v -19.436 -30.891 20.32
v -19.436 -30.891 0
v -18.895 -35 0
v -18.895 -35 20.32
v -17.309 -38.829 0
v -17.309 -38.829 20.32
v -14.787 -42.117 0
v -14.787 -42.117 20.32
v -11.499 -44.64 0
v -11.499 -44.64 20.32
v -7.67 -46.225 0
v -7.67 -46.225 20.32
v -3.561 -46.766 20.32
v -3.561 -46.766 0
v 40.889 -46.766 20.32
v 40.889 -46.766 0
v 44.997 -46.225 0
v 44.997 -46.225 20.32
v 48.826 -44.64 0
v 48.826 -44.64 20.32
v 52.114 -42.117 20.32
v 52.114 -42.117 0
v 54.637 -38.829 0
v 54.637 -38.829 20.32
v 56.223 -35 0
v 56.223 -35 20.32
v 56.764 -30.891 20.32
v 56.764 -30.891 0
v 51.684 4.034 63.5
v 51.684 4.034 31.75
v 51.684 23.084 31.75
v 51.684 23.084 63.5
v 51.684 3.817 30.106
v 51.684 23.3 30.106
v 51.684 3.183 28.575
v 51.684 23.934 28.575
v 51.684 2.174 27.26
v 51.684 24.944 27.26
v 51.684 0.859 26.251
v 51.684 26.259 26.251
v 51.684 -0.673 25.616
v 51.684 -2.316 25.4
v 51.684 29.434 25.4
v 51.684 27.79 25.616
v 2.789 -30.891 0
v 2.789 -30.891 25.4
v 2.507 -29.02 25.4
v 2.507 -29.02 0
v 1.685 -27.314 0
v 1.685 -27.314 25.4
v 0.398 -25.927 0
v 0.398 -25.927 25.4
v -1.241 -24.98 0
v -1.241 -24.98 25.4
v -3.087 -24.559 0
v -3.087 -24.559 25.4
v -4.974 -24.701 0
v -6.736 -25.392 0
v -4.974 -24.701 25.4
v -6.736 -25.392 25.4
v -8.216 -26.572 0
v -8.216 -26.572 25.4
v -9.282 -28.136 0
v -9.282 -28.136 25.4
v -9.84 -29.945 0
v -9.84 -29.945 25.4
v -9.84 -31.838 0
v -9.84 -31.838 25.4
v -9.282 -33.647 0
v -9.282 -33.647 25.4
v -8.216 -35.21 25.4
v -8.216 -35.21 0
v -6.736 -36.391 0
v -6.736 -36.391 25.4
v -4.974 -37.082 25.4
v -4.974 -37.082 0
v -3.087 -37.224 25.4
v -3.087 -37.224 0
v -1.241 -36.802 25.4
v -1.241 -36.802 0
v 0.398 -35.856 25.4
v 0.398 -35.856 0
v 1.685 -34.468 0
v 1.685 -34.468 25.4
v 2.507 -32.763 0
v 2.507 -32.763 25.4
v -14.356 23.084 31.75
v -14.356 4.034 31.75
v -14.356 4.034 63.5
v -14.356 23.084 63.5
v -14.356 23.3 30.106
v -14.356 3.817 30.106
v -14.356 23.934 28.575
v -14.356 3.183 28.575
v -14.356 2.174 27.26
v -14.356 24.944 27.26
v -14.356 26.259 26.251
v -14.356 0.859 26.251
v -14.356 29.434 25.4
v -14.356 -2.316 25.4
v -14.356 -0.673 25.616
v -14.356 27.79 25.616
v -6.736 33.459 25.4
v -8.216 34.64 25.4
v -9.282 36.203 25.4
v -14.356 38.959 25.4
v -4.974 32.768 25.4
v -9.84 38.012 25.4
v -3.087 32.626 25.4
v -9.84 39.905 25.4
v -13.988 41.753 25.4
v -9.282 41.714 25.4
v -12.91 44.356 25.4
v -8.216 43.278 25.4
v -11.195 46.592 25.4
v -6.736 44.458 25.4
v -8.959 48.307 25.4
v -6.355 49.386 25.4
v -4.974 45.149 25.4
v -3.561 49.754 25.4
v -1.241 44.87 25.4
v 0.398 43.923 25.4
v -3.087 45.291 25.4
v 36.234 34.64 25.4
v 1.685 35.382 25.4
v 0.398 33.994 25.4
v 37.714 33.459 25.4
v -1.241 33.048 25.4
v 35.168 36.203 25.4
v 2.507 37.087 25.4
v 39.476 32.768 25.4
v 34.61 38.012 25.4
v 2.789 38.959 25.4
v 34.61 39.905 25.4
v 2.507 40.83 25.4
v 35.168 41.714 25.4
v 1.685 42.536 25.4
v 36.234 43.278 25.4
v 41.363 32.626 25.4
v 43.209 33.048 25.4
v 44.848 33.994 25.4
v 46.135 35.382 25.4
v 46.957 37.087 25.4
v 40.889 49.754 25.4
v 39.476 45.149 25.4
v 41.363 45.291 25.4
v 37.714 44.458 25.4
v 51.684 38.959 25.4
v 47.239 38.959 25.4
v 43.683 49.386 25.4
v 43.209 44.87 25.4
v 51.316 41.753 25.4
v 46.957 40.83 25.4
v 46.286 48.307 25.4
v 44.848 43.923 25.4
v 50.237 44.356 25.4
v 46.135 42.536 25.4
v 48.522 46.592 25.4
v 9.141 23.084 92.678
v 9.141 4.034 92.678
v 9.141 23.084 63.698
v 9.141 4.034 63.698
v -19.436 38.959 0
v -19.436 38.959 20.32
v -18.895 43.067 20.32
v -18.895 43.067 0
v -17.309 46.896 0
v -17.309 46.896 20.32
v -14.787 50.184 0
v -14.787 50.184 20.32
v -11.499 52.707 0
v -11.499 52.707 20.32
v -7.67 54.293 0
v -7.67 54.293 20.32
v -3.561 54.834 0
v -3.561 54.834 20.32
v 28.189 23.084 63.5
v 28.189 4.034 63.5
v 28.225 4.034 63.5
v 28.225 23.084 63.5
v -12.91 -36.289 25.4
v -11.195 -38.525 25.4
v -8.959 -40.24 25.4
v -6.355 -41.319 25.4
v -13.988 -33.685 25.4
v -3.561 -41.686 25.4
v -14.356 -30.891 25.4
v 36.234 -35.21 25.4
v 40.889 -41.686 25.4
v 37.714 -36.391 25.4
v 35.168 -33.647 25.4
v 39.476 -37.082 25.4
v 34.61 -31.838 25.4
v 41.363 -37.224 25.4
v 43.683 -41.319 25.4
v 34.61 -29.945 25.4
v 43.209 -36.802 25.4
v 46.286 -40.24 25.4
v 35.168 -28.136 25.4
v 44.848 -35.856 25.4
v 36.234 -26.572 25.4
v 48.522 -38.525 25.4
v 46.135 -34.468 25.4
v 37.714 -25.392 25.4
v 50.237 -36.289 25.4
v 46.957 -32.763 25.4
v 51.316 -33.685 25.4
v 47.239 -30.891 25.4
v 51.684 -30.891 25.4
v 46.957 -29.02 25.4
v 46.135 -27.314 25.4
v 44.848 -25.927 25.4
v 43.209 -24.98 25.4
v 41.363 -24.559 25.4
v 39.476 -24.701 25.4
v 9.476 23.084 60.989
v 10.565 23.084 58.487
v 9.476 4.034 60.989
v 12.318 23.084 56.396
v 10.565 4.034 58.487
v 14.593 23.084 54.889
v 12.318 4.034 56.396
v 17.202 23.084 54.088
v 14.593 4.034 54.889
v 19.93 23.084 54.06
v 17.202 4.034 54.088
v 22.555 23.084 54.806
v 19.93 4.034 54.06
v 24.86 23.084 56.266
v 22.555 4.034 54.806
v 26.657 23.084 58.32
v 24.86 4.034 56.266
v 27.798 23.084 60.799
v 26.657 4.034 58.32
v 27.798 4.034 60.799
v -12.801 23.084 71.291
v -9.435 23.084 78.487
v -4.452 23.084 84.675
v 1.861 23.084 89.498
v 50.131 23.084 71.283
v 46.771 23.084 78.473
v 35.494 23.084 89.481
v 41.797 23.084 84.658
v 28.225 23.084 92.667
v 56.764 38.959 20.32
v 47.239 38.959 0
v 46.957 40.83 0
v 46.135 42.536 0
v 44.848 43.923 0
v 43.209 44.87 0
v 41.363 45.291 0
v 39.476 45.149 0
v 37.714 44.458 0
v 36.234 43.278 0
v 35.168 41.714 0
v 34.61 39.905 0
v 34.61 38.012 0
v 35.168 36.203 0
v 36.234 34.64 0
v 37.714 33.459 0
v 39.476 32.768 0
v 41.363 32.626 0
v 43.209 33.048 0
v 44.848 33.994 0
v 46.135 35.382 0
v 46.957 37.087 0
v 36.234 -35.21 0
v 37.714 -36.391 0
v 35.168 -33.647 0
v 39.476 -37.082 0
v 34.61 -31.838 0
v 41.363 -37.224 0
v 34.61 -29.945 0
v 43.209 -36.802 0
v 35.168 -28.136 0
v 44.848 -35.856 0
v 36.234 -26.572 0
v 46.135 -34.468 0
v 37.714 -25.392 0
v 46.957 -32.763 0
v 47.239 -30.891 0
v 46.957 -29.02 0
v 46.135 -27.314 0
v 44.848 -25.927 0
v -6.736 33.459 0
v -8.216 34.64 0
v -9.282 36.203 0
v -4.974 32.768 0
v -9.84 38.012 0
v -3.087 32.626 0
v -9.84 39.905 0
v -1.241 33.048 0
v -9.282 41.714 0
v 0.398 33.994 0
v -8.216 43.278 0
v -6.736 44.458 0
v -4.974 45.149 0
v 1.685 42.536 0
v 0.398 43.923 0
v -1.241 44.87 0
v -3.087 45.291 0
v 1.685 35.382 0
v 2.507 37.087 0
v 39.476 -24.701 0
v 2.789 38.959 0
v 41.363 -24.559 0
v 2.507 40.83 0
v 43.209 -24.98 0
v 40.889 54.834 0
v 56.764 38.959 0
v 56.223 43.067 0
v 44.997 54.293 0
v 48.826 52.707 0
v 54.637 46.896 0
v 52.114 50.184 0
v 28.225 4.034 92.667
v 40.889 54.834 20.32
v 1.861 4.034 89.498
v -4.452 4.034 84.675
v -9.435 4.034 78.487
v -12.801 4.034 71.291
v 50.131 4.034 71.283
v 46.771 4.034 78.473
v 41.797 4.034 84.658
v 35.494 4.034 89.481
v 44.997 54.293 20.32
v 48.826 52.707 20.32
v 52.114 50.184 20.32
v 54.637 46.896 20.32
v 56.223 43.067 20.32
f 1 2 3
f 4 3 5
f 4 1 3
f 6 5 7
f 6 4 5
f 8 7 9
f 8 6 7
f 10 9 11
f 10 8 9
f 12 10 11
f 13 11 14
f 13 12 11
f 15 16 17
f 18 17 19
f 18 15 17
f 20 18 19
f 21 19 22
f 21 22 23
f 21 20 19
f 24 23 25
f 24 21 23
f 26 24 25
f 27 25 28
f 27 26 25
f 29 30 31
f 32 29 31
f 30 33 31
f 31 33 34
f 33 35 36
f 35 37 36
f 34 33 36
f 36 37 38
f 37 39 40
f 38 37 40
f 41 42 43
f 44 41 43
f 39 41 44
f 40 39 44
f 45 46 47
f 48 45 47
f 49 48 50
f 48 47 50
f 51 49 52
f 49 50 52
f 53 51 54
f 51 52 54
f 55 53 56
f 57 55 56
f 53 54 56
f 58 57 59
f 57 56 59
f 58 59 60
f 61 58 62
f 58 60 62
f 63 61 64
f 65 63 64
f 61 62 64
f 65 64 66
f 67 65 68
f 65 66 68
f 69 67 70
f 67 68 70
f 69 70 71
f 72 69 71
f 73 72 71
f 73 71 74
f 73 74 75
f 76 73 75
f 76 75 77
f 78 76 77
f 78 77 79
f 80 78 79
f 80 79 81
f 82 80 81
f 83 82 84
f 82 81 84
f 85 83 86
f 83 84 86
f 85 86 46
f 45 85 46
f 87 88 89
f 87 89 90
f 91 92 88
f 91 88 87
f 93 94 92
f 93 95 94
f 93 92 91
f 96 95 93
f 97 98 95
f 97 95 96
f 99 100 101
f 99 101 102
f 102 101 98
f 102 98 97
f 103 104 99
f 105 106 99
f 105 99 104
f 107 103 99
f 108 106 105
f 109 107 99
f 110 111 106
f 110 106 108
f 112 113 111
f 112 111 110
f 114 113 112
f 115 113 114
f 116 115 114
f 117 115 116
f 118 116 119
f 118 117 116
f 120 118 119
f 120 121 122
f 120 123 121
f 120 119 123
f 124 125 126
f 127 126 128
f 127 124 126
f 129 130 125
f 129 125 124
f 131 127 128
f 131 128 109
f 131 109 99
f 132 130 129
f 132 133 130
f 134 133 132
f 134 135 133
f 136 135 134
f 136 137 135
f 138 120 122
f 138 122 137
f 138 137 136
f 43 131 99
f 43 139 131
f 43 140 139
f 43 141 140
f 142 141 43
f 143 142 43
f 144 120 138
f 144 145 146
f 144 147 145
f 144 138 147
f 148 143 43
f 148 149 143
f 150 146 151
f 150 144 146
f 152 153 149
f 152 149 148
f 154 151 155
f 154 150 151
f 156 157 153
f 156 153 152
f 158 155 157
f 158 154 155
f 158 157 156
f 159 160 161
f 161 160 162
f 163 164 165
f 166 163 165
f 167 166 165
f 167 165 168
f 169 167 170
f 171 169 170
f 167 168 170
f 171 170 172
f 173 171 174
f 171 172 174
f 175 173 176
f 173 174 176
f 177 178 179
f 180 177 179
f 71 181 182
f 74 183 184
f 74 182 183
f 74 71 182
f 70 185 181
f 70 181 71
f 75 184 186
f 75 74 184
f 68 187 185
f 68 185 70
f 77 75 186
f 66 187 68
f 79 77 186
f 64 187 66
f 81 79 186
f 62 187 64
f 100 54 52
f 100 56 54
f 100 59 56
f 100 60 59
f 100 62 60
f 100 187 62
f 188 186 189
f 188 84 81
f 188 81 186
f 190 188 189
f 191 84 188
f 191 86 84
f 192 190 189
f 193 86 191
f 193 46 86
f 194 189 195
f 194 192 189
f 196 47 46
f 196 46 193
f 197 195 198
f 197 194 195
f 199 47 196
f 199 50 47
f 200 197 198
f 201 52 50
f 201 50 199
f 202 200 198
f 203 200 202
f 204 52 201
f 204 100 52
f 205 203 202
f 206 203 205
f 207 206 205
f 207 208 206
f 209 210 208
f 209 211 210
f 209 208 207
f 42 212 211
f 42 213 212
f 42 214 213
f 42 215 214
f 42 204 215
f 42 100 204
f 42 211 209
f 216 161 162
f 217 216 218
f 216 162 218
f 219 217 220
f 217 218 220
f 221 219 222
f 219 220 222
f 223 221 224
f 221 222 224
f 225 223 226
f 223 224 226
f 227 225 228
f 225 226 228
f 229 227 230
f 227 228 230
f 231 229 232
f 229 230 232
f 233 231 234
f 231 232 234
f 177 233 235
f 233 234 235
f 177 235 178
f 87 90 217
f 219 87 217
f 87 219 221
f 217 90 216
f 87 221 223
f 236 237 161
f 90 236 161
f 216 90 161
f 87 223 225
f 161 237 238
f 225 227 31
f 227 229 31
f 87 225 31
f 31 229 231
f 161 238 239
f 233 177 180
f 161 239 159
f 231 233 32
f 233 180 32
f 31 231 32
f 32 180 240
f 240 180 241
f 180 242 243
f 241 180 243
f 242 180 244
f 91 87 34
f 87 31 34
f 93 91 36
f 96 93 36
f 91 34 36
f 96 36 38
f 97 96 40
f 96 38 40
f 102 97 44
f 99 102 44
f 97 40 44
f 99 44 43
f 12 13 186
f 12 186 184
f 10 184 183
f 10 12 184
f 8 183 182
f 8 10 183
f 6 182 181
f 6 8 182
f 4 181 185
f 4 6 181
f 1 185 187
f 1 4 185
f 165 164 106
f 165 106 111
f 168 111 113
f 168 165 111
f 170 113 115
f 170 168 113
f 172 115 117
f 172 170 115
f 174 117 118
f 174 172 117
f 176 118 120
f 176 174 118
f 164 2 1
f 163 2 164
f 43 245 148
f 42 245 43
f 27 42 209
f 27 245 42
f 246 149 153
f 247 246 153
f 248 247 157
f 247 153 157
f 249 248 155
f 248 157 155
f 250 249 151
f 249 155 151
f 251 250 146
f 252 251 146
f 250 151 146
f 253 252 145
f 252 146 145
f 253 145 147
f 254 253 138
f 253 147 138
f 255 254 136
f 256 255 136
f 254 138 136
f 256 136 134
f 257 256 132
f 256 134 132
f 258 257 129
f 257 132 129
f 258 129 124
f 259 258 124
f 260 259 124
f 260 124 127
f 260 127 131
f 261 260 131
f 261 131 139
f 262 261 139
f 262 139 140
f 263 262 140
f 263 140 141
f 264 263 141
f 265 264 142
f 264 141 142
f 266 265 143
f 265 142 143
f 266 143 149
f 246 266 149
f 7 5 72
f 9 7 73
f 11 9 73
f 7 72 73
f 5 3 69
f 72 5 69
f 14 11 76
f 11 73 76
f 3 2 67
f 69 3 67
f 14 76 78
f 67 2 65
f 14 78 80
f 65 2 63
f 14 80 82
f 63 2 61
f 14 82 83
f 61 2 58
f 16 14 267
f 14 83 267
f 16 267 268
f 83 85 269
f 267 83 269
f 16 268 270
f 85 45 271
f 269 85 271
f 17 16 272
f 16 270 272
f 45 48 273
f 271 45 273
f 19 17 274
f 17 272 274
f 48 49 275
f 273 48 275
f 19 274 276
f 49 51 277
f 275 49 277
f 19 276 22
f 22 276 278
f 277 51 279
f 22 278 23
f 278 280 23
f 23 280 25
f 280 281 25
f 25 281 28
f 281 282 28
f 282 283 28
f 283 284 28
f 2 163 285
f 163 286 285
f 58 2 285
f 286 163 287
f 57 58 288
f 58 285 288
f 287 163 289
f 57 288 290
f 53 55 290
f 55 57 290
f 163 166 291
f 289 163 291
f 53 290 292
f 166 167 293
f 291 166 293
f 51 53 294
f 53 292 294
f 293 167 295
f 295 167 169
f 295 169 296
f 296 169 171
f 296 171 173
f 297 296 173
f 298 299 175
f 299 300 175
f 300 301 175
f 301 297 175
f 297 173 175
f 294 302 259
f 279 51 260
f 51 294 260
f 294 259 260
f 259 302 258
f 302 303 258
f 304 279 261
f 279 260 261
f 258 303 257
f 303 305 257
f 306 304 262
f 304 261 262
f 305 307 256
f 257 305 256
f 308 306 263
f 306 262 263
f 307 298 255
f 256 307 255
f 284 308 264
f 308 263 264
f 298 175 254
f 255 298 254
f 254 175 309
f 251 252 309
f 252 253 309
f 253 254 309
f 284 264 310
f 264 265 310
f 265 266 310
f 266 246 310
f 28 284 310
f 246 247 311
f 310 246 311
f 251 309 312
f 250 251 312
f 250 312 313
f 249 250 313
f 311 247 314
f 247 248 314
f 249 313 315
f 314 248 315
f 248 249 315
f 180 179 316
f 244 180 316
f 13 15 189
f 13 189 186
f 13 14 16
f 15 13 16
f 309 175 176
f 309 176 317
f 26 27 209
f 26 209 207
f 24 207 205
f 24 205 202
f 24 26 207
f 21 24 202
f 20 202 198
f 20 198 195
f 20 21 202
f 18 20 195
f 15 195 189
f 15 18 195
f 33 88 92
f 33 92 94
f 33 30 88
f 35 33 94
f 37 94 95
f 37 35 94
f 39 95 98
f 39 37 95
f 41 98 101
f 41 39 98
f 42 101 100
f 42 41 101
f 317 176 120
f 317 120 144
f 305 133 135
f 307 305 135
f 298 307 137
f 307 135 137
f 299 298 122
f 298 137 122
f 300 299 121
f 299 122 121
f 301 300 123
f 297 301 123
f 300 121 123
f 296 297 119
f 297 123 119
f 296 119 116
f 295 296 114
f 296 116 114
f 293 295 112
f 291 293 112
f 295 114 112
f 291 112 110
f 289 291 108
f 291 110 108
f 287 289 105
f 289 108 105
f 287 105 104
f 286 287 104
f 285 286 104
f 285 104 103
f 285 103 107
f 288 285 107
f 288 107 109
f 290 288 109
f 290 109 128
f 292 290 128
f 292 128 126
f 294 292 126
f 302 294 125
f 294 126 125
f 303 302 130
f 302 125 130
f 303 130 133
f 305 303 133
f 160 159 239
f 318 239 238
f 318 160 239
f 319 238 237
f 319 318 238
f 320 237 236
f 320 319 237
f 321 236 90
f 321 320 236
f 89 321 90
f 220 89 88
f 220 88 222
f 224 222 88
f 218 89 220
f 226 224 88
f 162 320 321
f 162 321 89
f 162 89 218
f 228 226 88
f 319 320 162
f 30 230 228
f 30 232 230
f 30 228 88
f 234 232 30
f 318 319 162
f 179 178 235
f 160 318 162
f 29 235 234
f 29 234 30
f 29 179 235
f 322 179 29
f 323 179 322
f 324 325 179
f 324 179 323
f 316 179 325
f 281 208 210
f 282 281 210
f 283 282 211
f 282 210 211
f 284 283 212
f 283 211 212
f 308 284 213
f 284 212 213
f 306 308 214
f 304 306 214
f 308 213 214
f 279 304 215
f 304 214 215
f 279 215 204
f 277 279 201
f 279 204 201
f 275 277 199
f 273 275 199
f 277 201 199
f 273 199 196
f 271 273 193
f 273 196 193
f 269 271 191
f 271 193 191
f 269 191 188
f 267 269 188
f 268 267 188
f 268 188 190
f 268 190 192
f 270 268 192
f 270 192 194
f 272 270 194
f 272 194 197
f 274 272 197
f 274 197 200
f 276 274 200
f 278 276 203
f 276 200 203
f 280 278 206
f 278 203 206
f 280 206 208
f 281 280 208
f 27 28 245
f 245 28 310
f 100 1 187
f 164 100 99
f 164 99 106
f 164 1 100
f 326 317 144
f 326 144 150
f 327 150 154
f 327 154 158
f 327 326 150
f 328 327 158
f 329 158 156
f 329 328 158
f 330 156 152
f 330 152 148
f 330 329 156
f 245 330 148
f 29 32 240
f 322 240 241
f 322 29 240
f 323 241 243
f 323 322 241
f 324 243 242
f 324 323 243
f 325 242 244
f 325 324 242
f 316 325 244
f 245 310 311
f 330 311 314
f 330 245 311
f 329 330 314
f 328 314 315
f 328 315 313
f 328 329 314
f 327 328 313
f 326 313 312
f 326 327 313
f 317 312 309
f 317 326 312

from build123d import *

# Parameters (mm, degrees)
F0_W      = 76.2
F0_H      = 101.6
F1_DEPTH  = 25.4
F2_R      = 15.875
F3_SIZE   = 5.08
F4_R      = 6.35
F5_DEPTH  = 25.4
F6_W      = 66.04
F6_H      = 19.05
F7_DEPTH  = 38.1
F9_DEPTH  = 19.05
F10_R     = 9.525
F11_DEPTH = 25.4
F13_DEPTH = 25.4
F14_R     = 6.35


with BuildPart() as f1:
    # F0 (on Top) → F1 (new body)
    with BuildSketch(Plane.XY):
        with Locations((18.6636974156, 4.0336294651)):
            Rectangle(F0_W, F0_H)
    extrude(amount=F1_DEPTH)

    # F2
    f2_edges = [f1.edges().sort_by_distance(p)[0] for p in [
        (-19.436303, -46.766371, 12.7),
        (56.763697, -46.766371, 12.7),
        (56.763697, 54.833629, 12.7),
        (-19.436303, 54.833629, 12.7),
    ]]
    fillet(f2_edges, radius=F2_R)

    # F3
    f3_edges = [f1.edges().sort_by_distance(p)[0] for p in [
        (18.663697, 54.833629, 25.4),
        (-14.786623, 50.18395, 25.4),
        (-19.436303, 4.033629, 25.4),
        (-14.786623, -42.116691, 25.4),
        (18.663697, -46.766371, 25.4),
        (52.114018, -42.116691, 25.4),
        (56.763697, 4.033629, 25.4),
        (52.114018, 50.18395, 25.4),
    ]]
    chamfer(f3_edges, length=F3_SIZE)

    # F4 (on face) → F5 (cut)
    with BuildSketch(Plane.XY.offset(25.4)):
        with Locations((-3.5613025844, -30.8913705349)):
            Circle(F4_R)
        with Locations((-3.5613025844, 38.9586294651)):
            Circle(F4_R)
        with Locations((40.8886974156, 38.9586294651)):
            Circle(F4_R)
        with Locations((40.8886974156, -30.8913705349)):
            Circle(F4_R)
    extrude(amount=-F5_DEPTH, mode=Mode.SUBTRACT)

    # F6 (on face) → F7 (join)
    with BuildSketch(Plane.XY.offset(25.4)):
        with Locations((18.6636974156, 13.5586294651)):
            Rectangle(F6_W, F6_H)
    extrude(amount=F7_DEPTH)

    # F8 (on face) → F9 (join)
    with BuildSketch(Plane.XZ.offset(-4.0336294651)):
        with BuildLine():
            Line((-14.3563025844, 63.5), (51.6836974156, 63.5))
            ThreePointArc((51.6836974156, 63.5), (18.6636974156, 94.0767991723), (-14.3563025844, 63.5))
        make_face()
    extrude(amount=-F9_DEPTH)

    # F10 (on face) → F11 (cut)
    with BuildSketch(Plane.XZ.offset(-4.0336294651)):
        with Locations((18.6636974156, 63.5)):
            Circle(F10_R)
    extrude(amount=-F11_DEPTH, mode=Mode.SUBTRACT)

    # F12 (on face) → F13 (cut)
    with BuildSketch(Plane.XZ.offset(-4.0336294651)):
        Polygon((9.1407453584, 94.5832133293), (9.1407453584, 63.5), (28.1886974156, 63.5), (28.2250996679, 63.5), (28.2250996679, 94.5832133293), align=None)
    extrude(amount=-F13_DEPTH, mode=Mode.SUBTRACT)

    # F14
    f14_edges = [f1.edges().sort_by_distance(p)[0] for p in [
        (18.663697, 4.033629, 25.4),
        (18.663697, 23.083629, 25.4),
    ]]
    fillet(f14_edges, radius=F14_R)


solid = f1.part
